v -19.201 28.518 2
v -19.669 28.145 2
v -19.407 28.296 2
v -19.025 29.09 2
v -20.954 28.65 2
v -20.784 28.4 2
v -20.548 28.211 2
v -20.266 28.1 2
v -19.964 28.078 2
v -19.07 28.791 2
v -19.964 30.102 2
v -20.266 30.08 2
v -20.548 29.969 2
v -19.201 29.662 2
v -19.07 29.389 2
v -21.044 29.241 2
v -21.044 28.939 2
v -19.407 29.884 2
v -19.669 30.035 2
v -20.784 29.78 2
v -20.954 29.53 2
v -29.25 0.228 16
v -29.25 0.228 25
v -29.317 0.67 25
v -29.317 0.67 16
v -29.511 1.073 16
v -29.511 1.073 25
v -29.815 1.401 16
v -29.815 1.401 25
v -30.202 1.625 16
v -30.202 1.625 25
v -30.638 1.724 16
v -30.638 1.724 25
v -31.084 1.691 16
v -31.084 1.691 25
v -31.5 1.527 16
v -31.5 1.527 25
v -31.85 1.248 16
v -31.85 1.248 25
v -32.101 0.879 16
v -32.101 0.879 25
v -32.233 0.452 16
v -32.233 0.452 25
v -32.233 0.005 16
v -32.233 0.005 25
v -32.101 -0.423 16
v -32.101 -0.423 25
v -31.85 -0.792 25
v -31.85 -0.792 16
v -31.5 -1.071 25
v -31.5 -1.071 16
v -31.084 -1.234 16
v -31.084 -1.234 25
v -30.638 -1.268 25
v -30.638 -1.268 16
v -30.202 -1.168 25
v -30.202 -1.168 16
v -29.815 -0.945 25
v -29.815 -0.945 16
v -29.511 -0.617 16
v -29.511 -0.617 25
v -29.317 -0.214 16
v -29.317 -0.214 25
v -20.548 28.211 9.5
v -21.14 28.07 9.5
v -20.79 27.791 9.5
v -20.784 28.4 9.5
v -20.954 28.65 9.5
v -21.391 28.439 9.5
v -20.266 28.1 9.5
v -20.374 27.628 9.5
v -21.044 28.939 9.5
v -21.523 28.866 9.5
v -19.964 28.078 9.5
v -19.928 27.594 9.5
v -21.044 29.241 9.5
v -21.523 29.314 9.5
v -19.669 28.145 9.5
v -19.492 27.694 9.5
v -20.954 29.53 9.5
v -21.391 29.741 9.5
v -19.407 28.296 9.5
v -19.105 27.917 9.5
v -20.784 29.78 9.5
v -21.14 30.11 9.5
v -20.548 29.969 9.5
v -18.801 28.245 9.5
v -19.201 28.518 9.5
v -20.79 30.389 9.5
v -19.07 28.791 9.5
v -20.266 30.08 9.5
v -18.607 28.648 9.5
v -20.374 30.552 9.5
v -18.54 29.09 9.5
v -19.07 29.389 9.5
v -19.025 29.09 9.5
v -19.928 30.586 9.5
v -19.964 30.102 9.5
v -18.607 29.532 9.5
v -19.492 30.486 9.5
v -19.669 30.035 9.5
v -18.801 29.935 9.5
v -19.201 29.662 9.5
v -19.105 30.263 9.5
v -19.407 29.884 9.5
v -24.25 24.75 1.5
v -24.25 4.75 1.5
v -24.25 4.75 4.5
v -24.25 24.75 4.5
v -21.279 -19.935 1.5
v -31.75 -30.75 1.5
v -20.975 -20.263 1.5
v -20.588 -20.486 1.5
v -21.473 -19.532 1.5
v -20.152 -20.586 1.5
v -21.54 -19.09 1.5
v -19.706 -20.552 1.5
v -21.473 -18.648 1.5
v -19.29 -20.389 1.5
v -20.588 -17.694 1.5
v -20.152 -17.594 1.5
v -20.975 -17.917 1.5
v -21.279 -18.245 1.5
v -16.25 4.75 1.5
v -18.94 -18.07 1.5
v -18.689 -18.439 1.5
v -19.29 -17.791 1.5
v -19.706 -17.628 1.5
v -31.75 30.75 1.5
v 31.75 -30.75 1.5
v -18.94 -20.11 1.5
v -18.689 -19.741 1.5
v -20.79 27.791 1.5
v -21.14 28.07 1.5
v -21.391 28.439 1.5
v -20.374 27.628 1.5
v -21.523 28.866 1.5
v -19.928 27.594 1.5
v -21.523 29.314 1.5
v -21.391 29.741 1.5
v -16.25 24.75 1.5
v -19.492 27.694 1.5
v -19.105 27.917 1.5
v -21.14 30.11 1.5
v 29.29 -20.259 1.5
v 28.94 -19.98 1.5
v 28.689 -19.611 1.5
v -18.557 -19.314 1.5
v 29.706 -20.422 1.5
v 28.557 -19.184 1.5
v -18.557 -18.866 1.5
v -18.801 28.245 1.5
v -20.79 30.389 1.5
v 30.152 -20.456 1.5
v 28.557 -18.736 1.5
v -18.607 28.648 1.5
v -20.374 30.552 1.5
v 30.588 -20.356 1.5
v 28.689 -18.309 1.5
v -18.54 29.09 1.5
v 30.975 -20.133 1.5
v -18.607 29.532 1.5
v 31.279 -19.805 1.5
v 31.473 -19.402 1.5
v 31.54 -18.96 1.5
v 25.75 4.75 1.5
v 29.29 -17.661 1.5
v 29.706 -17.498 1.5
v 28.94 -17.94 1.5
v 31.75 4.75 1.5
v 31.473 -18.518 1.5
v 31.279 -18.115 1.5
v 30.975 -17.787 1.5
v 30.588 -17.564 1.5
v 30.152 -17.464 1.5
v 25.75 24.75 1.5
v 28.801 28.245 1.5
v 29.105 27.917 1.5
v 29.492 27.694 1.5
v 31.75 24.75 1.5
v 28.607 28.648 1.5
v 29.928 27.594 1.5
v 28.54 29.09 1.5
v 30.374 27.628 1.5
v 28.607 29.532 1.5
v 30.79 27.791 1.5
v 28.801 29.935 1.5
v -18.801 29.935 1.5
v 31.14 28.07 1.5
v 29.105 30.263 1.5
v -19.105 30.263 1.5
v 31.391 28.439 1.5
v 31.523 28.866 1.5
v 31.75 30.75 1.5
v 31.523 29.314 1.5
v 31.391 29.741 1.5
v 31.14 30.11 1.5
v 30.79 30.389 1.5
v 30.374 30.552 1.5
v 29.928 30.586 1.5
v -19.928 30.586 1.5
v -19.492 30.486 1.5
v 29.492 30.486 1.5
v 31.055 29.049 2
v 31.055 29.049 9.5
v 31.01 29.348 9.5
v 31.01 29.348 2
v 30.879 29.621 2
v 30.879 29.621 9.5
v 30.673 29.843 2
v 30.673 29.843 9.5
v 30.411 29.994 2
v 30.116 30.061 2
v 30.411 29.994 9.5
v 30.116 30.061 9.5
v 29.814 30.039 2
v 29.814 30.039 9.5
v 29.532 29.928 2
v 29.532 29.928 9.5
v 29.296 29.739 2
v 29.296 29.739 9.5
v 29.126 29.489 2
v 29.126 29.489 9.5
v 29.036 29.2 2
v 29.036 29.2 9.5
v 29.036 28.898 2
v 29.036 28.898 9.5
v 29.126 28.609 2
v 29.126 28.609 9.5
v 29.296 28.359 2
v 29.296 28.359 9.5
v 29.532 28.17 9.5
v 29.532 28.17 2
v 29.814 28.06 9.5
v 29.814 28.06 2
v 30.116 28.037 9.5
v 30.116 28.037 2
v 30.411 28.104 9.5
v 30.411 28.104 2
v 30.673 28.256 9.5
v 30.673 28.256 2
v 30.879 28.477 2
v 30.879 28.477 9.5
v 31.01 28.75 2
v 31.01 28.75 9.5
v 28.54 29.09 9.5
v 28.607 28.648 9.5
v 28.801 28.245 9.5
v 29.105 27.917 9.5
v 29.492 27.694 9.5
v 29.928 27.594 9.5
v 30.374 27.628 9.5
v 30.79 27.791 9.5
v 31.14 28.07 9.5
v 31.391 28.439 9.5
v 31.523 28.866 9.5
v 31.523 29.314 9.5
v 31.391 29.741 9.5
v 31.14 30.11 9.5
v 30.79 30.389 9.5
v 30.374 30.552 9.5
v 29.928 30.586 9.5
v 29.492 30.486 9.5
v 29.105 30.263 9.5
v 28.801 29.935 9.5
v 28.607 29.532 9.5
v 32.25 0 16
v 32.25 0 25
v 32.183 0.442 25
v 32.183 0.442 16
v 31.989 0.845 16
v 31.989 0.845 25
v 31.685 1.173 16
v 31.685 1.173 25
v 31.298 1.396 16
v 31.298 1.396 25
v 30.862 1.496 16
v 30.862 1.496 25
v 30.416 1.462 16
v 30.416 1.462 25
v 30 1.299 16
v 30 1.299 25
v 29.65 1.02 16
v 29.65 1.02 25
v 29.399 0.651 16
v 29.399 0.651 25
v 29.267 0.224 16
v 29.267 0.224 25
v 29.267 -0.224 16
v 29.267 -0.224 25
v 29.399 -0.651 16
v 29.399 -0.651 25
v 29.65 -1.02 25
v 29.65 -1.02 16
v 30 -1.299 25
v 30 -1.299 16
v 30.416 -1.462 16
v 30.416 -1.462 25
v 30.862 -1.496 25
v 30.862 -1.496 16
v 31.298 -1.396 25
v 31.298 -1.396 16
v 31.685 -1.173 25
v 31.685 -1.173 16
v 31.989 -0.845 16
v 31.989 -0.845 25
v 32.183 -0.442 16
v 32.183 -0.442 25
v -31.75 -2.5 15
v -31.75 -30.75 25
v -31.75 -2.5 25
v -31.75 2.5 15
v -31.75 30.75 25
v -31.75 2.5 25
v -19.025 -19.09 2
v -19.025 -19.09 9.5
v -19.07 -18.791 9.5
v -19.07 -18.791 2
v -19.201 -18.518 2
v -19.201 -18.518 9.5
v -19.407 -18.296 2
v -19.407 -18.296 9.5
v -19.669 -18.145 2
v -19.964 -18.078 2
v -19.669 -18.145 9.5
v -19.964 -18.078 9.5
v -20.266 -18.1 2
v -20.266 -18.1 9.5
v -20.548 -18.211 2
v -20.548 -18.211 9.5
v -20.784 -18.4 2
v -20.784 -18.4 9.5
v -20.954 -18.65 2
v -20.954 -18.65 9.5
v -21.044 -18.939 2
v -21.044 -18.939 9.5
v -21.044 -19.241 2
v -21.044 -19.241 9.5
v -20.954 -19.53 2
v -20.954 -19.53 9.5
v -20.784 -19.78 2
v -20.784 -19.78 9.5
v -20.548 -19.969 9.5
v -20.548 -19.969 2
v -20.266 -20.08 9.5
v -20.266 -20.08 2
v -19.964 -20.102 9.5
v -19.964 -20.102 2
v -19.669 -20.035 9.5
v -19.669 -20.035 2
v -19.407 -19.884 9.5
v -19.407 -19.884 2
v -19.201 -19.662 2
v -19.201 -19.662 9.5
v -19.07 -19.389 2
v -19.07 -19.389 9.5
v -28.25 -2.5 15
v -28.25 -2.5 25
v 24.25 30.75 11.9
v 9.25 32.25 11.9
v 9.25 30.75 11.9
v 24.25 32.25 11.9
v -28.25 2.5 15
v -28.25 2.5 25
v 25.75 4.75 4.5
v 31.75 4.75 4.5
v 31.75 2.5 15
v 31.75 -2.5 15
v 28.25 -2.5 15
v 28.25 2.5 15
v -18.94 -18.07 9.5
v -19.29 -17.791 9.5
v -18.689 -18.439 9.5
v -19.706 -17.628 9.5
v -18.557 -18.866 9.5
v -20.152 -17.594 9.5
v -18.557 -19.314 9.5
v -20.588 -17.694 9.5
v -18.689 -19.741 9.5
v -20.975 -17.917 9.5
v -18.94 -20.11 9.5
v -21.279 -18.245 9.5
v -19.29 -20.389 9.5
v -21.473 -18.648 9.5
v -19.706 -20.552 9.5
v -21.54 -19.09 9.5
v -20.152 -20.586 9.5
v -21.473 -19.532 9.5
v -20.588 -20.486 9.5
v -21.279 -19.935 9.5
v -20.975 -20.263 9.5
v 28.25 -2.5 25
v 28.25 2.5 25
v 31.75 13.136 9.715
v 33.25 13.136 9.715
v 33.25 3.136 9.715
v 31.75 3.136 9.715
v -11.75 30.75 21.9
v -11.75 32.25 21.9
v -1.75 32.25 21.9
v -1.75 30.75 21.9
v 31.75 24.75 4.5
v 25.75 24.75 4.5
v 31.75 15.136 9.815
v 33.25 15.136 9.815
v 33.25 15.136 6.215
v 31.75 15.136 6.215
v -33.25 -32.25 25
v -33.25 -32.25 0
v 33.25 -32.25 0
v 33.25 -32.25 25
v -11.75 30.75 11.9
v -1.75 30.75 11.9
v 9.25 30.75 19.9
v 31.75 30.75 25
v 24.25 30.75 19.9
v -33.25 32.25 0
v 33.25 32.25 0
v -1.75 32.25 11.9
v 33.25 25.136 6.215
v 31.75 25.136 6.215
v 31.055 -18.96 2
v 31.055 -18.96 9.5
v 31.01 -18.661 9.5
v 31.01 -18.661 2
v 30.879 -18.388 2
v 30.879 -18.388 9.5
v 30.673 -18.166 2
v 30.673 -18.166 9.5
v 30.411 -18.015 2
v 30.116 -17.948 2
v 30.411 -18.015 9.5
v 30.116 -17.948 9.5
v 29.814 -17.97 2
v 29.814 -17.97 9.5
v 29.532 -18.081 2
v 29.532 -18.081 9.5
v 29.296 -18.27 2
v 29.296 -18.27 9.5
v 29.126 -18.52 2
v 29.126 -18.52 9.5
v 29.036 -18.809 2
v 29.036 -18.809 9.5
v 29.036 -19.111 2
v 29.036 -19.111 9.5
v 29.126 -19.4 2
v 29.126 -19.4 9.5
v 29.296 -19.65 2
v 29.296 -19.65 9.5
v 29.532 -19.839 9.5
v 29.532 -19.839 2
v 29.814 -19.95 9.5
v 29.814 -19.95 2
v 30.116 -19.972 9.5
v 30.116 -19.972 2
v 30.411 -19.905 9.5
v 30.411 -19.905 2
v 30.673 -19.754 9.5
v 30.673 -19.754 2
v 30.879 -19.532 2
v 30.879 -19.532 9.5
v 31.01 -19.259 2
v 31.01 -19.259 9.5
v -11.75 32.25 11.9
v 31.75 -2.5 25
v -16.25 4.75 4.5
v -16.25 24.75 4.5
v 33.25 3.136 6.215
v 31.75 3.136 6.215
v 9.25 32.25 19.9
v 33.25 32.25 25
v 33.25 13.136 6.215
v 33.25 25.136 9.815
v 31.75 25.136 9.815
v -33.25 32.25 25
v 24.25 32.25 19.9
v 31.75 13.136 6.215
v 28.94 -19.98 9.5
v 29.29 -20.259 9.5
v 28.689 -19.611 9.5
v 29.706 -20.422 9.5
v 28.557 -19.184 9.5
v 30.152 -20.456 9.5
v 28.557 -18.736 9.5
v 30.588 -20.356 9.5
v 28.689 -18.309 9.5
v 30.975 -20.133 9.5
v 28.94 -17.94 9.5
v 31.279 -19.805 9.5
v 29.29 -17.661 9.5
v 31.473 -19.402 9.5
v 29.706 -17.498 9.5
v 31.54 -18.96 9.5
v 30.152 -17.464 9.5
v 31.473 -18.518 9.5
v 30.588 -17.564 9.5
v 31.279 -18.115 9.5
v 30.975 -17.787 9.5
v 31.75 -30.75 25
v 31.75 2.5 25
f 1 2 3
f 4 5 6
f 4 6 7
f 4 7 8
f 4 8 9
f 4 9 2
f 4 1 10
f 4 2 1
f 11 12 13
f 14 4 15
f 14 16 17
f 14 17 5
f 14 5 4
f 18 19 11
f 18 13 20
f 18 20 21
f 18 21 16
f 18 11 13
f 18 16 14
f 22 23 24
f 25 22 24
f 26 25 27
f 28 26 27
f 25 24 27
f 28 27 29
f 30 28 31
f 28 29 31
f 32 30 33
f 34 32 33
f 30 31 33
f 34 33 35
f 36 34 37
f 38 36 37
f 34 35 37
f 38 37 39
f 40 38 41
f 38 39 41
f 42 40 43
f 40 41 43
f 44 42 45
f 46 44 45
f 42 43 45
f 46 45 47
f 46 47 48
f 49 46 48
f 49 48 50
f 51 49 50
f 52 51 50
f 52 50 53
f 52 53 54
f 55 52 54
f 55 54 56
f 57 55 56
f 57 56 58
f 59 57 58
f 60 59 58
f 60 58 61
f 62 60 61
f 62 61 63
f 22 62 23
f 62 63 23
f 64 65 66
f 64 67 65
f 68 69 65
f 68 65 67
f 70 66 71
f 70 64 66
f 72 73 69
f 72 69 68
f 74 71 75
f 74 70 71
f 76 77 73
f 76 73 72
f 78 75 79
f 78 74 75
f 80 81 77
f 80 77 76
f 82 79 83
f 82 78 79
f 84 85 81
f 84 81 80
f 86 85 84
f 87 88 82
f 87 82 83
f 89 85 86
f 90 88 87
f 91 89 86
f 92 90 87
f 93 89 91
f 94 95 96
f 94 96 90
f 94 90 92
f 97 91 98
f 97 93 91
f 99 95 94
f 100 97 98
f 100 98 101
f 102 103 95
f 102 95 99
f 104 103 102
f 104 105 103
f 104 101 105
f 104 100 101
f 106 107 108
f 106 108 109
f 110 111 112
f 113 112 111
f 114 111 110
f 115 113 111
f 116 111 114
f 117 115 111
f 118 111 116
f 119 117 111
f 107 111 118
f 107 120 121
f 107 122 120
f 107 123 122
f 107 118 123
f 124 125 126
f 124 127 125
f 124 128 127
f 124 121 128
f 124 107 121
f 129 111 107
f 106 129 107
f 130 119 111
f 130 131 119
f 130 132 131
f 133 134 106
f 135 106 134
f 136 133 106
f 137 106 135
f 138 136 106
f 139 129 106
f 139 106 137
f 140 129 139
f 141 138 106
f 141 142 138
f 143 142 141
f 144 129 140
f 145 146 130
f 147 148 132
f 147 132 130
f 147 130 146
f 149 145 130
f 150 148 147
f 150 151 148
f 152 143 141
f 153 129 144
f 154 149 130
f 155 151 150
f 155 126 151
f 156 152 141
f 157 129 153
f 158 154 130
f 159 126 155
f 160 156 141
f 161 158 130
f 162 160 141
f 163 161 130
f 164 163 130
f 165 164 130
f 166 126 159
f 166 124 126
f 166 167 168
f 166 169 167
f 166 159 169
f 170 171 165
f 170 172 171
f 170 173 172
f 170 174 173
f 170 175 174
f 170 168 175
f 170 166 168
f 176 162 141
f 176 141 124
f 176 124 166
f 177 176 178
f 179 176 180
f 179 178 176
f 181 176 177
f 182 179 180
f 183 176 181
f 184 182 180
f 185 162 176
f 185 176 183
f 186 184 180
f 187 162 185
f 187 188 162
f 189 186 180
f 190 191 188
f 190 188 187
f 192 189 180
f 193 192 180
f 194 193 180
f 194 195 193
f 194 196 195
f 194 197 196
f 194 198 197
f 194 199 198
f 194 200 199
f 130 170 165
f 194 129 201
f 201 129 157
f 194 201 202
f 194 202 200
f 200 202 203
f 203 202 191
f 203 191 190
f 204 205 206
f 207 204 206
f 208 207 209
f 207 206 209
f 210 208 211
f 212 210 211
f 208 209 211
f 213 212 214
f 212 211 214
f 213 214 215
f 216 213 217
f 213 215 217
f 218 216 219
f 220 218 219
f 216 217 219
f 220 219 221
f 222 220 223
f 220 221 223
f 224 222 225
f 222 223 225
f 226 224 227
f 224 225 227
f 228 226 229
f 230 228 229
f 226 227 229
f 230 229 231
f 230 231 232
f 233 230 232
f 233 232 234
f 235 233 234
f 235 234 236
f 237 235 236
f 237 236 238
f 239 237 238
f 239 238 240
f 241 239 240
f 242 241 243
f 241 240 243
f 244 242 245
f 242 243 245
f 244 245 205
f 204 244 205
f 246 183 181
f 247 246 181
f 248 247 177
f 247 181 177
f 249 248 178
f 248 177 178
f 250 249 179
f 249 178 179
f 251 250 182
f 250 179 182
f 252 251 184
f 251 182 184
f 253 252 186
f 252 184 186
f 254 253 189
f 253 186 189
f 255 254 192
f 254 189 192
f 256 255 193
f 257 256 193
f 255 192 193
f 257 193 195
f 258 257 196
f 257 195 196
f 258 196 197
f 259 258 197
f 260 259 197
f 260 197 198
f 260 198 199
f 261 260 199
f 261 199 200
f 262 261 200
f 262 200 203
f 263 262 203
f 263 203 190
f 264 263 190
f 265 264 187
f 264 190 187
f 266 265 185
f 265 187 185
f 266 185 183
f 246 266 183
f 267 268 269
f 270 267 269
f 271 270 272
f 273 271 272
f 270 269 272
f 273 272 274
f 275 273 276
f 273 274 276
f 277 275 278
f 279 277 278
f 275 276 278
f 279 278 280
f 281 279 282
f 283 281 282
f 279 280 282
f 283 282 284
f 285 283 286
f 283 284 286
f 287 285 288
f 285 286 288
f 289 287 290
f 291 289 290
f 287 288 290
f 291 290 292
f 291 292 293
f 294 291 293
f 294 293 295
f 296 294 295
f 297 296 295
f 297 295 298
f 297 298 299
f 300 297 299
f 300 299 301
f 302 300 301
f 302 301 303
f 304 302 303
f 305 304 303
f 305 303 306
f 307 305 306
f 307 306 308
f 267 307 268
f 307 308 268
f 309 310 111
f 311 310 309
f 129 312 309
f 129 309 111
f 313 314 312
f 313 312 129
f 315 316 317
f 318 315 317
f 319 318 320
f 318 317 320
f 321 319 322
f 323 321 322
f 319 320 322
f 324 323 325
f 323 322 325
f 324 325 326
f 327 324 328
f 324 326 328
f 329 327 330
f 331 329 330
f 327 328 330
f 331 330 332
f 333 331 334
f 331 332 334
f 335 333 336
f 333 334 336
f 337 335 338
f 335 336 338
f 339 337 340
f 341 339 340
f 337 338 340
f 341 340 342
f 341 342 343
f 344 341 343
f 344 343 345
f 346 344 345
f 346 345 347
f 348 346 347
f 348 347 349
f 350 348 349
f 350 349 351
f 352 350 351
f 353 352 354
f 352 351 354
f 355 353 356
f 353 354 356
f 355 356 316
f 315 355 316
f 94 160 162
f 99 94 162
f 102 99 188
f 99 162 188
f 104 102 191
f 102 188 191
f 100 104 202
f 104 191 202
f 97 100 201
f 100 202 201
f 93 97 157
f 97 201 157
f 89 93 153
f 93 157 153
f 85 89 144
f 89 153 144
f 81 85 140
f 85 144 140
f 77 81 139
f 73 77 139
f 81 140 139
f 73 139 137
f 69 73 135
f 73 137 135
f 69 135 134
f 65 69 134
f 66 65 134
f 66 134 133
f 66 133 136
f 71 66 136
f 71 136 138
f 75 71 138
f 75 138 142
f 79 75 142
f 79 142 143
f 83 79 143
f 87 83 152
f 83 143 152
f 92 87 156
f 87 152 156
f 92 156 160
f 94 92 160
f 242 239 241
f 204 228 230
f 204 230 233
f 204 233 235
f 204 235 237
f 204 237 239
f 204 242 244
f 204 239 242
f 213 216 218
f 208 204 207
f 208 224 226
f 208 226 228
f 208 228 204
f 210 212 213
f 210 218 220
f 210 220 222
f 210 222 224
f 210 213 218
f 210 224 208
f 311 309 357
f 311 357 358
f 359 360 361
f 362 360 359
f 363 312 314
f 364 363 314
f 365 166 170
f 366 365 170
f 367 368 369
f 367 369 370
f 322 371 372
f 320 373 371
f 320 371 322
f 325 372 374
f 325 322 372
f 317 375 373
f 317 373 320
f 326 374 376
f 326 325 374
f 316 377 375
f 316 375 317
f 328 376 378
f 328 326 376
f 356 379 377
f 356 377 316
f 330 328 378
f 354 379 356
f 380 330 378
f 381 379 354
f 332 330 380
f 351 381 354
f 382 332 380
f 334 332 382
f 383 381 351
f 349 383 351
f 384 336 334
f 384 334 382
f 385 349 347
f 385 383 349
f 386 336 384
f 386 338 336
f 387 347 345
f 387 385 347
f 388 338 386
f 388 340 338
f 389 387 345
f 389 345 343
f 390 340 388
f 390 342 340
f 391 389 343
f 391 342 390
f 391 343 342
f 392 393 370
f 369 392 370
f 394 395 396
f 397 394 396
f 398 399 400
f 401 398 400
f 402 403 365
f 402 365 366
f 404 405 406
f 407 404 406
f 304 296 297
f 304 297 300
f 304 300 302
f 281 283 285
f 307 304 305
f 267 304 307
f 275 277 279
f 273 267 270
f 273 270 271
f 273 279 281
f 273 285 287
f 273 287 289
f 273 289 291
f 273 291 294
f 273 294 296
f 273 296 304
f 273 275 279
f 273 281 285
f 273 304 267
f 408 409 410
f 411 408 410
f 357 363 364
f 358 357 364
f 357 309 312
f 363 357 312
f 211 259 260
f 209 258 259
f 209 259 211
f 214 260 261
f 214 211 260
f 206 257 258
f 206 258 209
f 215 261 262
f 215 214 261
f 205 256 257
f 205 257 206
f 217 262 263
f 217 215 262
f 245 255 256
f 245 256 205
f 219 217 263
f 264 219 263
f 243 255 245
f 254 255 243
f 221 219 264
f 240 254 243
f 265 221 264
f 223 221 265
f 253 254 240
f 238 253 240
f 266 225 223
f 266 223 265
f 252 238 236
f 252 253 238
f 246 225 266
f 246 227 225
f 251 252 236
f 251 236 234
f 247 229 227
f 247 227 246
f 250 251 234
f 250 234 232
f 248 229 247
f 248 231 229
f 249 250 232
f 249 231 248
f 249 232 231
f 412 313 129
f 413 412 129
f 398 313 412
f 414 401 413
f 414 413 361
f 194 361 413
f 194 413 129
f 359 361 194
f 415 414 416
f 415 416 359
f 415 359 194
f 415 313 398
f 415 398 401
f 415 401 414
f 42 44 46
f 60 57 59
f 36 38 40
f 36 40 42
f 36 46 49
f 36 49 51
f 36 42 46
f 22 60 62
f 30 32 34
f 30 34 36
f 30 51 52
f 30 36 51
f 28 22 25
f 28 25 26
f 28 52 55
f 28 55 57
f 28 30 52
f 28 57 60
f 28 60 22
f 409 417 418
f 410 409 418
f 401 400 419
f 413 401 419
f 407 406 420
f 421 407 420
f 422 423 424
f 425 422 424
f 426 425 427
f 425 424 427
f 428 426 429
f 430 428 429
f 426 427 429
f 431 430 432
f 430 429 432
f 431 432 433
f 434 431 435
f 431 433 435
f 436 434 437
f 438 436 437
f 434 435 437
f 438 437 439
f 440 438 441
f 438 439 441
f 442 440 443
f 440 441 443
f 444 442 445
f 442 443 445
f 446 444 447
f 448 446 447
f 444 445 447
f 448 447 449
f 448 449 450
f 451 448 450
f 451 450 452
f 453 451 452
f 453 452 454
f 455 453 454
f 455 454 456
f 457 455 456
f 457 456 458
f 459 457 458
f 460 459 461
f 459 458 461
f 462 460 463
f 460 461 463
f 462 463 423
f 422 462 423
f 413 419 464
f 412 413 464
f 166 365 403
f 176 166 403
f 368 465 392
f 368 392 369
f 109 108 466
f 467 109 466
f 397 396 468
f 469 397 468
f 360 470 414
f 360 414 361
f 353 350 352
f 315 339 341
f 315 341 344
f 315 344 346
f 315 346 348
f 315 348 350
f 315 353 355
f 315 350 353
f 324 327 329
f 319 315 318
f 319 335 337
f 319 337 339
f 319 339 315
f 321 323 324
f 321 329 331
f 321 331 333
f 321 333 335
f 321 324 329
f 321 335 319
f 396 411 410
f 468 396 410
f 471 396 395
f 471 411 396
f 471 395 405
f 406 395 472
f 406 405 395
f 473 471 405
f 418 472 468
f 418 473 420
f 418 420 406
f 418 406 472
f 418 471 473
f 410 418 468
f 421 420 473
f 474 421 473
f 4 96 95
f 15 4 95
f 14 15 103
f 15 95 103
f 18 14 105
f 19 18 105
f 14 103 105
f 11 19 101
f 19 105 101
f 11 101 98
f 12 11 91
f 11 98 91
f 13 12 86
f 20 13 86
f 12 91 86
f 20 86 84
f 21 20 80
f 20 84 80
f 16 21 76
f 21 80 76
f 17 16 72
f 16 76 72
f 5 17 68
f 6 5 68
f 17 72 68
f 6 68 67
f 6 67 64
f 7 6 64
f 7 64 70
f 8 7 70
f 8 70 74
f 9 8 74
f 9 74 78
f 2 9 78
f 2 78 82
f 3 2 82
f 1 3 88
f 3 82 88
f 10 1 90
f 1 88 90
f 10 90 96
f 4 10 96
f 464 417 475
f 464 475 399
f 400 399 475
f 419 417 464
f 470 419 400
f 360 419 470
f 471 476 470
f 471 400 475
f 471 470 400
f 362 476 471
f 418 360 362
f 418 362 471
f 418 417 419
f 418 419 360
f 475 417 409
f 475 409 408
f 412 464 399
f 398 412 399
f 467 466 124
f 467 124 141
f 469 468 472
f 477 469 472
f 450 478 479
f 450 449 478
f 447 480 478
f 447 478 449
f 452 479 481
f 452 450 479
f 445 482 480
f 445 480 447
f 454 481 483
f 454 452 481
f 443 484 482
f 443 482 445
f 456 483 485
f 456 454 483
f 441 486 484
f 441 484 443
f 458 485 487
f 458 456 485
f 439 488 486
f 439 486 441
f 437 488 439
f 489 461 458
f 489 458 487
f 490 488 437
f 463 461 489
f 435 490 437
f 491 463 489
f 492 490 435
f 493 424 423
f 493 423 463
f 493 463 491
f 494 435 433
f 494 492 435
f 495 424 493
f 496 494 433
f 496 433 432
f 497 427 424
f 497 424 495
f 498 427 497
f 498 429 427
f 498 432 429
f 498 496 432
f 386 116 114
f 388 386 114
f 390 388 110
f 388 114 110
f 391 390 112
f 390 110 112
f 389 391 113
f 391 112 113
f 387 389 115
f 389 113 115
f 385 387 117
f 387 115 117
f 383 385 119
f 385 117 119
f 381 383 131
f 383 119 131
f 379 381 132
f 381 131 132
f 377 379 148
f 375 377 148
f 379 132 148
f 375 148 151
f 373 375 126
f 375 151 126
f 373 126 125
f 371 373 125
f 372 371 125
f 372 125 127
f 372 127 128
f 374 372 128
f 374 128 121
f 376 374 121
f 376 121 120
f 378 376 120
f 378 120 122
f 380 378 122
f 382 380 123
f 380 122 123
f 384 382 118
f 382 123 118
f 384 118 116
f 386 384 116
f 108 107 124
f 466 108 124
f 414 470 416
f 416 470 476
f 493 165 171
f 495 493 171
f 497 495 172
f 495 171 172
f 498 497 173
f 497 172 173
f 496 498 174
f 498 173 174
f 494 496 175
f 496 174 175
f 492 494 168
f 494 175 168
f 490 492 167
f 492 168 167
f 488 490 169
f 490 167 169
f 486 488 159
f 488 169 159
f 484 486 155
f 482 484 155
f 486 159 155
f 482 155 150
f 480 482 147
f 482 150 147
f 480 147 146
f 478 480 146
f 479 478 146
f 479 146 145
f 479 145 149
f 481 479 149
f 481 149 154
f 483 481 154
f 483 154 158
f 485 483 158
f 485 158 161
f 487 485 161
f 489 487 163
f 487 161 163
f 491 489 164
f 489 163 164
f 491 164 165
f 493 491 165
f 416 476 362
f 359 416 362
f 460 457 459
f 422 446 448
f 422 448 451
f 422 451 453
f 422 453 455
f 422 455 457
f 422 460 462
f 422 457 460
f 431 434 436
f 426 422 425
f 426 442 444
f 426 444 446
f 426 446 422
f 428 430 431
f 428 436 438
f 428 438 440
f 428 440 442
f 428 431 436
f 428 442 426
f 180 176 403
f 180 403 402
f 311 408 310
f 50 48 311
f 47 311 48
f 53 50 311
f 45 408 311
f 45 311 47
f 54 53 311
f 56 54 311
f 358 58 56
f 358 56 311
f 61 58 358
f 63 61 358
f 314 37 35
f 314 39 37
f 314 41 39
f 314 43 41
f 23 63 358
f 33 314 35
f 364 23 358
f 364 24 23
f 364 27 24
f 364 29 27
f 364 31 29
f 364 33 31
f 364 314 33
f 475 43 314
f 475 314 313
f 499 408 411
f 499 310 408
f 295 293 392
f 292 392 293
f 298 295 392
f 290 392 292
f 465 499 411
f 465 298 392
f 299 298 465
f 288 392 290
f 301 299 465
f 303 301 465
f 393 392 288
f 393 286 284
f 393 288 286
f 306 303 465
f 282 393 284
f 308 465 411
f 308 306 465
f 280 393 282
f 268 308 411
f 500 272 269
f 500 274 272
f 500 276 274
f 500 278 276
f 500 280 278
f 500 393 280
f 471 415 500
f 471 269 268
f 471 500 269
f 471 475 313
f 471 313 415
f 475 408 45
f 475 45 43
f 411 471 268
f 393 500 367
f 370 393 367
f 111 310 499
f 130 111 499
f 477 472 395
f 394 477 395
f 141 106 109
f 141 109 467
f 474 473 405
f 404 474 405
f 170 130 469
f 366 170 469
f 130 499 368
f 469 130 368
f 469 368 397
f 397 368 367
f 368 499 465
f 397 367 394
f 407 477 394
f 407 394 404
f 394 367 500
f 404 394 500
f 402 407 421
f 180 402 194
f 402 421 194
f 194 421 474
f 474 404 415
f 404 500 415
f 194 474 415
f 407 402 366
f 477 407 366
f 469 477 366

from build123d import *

# Parameters (mm, degrees)
SKETCH1_W            = 66.5
SKETCH1_H            = 64.5
BOSS_EXTRUDE1_DEPTH  = 25
SKETCH2_W            = 63.5
SKETCH2_H            = 61.5
CUT_EXTRUDE2_DEPTH   = 23.5
SKETCH9_W            = 10
SKETCH9_H            = 5
BOSS_EXTRUDE5_DEPTH  = 5
SKETCH14_R           = 1.5
CUT_EXTRUDE4_DEPTH   = 9
SKETCH17_W           = 10
SKETCH17_H           = 2.5
BOSS_EXTRUDE7_DEPTH  = 5
SKETCH18_R           = 1.5
CUT_EXTRUDE6_DEPTH   = 9
SKETCH19_R           = 1.5
BOSS_EXTRUDE9_DEPTH  = 8
SKETCH22_R           = 1.015
CUT_EXTRUDE7_DEPTH   = 7.5
SKETCH23_W           = 56
SKETCH23_H           = 20
BOSS_EXTRUDE12_DEPTH = 3
SKETCH26_W           = 42
SKETCH26_H           = 20
CUT_EXTRUDE9_DEPTH   = 3
CUT_EXTRUDE12_DEPTH  = 3
CUT_EXTRUDE13_DEPTH  = 3
SKETCH51_W           = 15
SKETCH51_H           = 8
CUT_EXTRUDE14_DEPTH  = 1.5


with BuildPart() as part:
    # Sketch1 → Boss-Extrude1 (new body)
    with BuildSketch(Plane.XY):
        Rectangle(SKETCH1_W, SKETCH1_H)
    extrude(amount=BOSS_EXTRUDE1_DEPTH)

    # Sketch2 → Cut-Extrude2 (cut)
    with BuildSketch(Plane.XY.offset(25)):
        Rectangle(SKETCH2_W, SKETCH2_H)
    extrude(amount=-CUT_EXTRUDE2_DEPTH, mode=Mode.SUBTRACT)

    # Sketch9 → Boss-Extrude5 (add)
    with BuildSketch(Plane.ZY.offset(33.25)):
        with Locations((20, 0)):
            Rectangle(SKETCH9_W, SKETCH9_H)
    extrude(amount=-BOSS_EXTRUDE5_DEPTH)

    # Sketch14 → Cut-Extrude4 (cut)
    with BuildSketch(Plane.XY.offset(25)):
        with Locations((-30.75, 0.228198866)):
            Circle(SKETCH14_R)
    extrude(amount=-CUT_EXTRUDE4_DEPTH, mode=Mode.SUBTRACT)

    # Sketch17 → Boss-Extrude7 (add)
    with BuildSketch(Plane(origin=(33.25, 0, 0), x_dir=(0, 0, -1), z_dir=(1, 0, 0))):
        with Locations((-20, 1.25)):
            Rectangle(SKETCH17_W, SKETCH17_H)
        with Locations((-20, -1.25)):
            Rectangle(SKETCH17_W, SKETCH17_H)
    extrude(amount=-BOSS_EXTRUDE7_DEPTH)

    # Sketch18 → Cut-Extrude6 (cut)
    with BuildSketch(Plane.XY.offset(25)):
        with Locations((30.75, 0)):
            Circle(SKETCH18_R)
    extrude(amount=-CUT_EXTRUDE6_DEPTH, mode=Mode.SUBTRACT)

    # Sketch19 → Boss-Extrude9 (add)
    with BuildSketch(Plane.XY.offset(1.5)):
        with Locations((-20.04, 29.09)):
            Circle(SKETCH19_R)
        with Locations(Location((30.04, 29.09, 0), (0, 0, 180))):
            Circle(SKETCH19_R)
        with Locations(Location((-20.04, -19.09, 0), (0, 0, 180))):
            Circle(SKETCH19_R)
        with Locations((30.04, -18.96)):
            Circle(SKETCH19_R)
    extrude(amount=BOSS_EXTRUDE9_DEPTH)

    # Sketch22 → Cut-Extrude7 (cut)
    with BuildSketch(Plane.XY.offset(9.5)):
        with Locations((-20.04, 29.09)):
            Circle(SKETCH22_R)
        with Locations((30.04, 29.049098521)):
            Circle(SKETCH22_R)
        with Locations((30.04, -18.96)):
            Circle(SKETCH22_R)
        with Locations((-20.04, -19.09)):
            Circle(SKETCH22_R)
    extrude(amount=-CUT_EXTRUDE7_DEPTH, mode=Mode.SUBTRACT)

    # Sketch23 → Boss-Extrude12 (add)
    with BuildSketch(Plane.XY.offset(1.5)):
        with Locations((3.75, 14.75)):
            Rectangle(SKETCH23_W, SKETCH23_H)
    extrude(amount=BOSS_EXTRUDE12_DEPTH)

    # Sketch26 → Cut-Extrude9 (cut)
    with BuildSketch(Plane.XY.offset(4.5)):
        with Locations((4.75, 14.75)):
            Rectangle(SKETCH26_W, SKETCH26_H)
    extrude(amount=-CUT_EXTRUDE9_DEPTH, mode=Mode.SUBTRACT)

    # Sketch45 → Cut-Extrude12 (cut)
    with BuildSketch(Plane(origin=(33.25, 0, 0), x_dir=(0, 0, -1), z_dir=(1, 0, 0))):
        Polygon((-9.814807173, 15.135540206), (-6.214807173, 15.135540206), (-6.214807173, 24.735863123), (-6.214807173, 25.135540206), (-9.814807173, 25.135540206), align=None)
        Polygon((-6.214807173, 4.436476389), (-6.214807173, 13.135540206), (-9.714807173, 13.135540206), (-9.714807173, 3.135540206), (-6.214807173, 3.135540206), align=None)
    extrude(amount=-CUT_EXTRUDE12_DEPTH, mode=Mode.SUBTRACT)

    # Sketch46 → Cut-Extrude13 (cut)
    with BuildSketch(Plane(origin=(0, 32.25, 0), x_dir=(1, 0, 0), z_dir=(0, 1, 0))):
        Polygon((-11.263140916, -11.9), (-11.75, -11.9), (-11.75, -21.9), (-1.75, -21.9), (-1.75, -11.9), align=None)
    extrude(amount=-CUT_EXTRUDE13_DEPTH, mode=Mode.SUBTRACT)

    # Sketch51 → Cut-Extrude14 (cut)
    with BuildSketch(Plane(origin=(0, 32.25, 0), x_dir=(1, 0, 0), z_dir=(0, 1, 0))):
        with Locations((16.75, -15.9)):
            Rectangle(SKETCH51_W, SKETCH51_H)
    extrude(amount=-CUT_EXTRUDE14_DEPTH, mode=Mode.SUBTRACT)


solid = part.part
